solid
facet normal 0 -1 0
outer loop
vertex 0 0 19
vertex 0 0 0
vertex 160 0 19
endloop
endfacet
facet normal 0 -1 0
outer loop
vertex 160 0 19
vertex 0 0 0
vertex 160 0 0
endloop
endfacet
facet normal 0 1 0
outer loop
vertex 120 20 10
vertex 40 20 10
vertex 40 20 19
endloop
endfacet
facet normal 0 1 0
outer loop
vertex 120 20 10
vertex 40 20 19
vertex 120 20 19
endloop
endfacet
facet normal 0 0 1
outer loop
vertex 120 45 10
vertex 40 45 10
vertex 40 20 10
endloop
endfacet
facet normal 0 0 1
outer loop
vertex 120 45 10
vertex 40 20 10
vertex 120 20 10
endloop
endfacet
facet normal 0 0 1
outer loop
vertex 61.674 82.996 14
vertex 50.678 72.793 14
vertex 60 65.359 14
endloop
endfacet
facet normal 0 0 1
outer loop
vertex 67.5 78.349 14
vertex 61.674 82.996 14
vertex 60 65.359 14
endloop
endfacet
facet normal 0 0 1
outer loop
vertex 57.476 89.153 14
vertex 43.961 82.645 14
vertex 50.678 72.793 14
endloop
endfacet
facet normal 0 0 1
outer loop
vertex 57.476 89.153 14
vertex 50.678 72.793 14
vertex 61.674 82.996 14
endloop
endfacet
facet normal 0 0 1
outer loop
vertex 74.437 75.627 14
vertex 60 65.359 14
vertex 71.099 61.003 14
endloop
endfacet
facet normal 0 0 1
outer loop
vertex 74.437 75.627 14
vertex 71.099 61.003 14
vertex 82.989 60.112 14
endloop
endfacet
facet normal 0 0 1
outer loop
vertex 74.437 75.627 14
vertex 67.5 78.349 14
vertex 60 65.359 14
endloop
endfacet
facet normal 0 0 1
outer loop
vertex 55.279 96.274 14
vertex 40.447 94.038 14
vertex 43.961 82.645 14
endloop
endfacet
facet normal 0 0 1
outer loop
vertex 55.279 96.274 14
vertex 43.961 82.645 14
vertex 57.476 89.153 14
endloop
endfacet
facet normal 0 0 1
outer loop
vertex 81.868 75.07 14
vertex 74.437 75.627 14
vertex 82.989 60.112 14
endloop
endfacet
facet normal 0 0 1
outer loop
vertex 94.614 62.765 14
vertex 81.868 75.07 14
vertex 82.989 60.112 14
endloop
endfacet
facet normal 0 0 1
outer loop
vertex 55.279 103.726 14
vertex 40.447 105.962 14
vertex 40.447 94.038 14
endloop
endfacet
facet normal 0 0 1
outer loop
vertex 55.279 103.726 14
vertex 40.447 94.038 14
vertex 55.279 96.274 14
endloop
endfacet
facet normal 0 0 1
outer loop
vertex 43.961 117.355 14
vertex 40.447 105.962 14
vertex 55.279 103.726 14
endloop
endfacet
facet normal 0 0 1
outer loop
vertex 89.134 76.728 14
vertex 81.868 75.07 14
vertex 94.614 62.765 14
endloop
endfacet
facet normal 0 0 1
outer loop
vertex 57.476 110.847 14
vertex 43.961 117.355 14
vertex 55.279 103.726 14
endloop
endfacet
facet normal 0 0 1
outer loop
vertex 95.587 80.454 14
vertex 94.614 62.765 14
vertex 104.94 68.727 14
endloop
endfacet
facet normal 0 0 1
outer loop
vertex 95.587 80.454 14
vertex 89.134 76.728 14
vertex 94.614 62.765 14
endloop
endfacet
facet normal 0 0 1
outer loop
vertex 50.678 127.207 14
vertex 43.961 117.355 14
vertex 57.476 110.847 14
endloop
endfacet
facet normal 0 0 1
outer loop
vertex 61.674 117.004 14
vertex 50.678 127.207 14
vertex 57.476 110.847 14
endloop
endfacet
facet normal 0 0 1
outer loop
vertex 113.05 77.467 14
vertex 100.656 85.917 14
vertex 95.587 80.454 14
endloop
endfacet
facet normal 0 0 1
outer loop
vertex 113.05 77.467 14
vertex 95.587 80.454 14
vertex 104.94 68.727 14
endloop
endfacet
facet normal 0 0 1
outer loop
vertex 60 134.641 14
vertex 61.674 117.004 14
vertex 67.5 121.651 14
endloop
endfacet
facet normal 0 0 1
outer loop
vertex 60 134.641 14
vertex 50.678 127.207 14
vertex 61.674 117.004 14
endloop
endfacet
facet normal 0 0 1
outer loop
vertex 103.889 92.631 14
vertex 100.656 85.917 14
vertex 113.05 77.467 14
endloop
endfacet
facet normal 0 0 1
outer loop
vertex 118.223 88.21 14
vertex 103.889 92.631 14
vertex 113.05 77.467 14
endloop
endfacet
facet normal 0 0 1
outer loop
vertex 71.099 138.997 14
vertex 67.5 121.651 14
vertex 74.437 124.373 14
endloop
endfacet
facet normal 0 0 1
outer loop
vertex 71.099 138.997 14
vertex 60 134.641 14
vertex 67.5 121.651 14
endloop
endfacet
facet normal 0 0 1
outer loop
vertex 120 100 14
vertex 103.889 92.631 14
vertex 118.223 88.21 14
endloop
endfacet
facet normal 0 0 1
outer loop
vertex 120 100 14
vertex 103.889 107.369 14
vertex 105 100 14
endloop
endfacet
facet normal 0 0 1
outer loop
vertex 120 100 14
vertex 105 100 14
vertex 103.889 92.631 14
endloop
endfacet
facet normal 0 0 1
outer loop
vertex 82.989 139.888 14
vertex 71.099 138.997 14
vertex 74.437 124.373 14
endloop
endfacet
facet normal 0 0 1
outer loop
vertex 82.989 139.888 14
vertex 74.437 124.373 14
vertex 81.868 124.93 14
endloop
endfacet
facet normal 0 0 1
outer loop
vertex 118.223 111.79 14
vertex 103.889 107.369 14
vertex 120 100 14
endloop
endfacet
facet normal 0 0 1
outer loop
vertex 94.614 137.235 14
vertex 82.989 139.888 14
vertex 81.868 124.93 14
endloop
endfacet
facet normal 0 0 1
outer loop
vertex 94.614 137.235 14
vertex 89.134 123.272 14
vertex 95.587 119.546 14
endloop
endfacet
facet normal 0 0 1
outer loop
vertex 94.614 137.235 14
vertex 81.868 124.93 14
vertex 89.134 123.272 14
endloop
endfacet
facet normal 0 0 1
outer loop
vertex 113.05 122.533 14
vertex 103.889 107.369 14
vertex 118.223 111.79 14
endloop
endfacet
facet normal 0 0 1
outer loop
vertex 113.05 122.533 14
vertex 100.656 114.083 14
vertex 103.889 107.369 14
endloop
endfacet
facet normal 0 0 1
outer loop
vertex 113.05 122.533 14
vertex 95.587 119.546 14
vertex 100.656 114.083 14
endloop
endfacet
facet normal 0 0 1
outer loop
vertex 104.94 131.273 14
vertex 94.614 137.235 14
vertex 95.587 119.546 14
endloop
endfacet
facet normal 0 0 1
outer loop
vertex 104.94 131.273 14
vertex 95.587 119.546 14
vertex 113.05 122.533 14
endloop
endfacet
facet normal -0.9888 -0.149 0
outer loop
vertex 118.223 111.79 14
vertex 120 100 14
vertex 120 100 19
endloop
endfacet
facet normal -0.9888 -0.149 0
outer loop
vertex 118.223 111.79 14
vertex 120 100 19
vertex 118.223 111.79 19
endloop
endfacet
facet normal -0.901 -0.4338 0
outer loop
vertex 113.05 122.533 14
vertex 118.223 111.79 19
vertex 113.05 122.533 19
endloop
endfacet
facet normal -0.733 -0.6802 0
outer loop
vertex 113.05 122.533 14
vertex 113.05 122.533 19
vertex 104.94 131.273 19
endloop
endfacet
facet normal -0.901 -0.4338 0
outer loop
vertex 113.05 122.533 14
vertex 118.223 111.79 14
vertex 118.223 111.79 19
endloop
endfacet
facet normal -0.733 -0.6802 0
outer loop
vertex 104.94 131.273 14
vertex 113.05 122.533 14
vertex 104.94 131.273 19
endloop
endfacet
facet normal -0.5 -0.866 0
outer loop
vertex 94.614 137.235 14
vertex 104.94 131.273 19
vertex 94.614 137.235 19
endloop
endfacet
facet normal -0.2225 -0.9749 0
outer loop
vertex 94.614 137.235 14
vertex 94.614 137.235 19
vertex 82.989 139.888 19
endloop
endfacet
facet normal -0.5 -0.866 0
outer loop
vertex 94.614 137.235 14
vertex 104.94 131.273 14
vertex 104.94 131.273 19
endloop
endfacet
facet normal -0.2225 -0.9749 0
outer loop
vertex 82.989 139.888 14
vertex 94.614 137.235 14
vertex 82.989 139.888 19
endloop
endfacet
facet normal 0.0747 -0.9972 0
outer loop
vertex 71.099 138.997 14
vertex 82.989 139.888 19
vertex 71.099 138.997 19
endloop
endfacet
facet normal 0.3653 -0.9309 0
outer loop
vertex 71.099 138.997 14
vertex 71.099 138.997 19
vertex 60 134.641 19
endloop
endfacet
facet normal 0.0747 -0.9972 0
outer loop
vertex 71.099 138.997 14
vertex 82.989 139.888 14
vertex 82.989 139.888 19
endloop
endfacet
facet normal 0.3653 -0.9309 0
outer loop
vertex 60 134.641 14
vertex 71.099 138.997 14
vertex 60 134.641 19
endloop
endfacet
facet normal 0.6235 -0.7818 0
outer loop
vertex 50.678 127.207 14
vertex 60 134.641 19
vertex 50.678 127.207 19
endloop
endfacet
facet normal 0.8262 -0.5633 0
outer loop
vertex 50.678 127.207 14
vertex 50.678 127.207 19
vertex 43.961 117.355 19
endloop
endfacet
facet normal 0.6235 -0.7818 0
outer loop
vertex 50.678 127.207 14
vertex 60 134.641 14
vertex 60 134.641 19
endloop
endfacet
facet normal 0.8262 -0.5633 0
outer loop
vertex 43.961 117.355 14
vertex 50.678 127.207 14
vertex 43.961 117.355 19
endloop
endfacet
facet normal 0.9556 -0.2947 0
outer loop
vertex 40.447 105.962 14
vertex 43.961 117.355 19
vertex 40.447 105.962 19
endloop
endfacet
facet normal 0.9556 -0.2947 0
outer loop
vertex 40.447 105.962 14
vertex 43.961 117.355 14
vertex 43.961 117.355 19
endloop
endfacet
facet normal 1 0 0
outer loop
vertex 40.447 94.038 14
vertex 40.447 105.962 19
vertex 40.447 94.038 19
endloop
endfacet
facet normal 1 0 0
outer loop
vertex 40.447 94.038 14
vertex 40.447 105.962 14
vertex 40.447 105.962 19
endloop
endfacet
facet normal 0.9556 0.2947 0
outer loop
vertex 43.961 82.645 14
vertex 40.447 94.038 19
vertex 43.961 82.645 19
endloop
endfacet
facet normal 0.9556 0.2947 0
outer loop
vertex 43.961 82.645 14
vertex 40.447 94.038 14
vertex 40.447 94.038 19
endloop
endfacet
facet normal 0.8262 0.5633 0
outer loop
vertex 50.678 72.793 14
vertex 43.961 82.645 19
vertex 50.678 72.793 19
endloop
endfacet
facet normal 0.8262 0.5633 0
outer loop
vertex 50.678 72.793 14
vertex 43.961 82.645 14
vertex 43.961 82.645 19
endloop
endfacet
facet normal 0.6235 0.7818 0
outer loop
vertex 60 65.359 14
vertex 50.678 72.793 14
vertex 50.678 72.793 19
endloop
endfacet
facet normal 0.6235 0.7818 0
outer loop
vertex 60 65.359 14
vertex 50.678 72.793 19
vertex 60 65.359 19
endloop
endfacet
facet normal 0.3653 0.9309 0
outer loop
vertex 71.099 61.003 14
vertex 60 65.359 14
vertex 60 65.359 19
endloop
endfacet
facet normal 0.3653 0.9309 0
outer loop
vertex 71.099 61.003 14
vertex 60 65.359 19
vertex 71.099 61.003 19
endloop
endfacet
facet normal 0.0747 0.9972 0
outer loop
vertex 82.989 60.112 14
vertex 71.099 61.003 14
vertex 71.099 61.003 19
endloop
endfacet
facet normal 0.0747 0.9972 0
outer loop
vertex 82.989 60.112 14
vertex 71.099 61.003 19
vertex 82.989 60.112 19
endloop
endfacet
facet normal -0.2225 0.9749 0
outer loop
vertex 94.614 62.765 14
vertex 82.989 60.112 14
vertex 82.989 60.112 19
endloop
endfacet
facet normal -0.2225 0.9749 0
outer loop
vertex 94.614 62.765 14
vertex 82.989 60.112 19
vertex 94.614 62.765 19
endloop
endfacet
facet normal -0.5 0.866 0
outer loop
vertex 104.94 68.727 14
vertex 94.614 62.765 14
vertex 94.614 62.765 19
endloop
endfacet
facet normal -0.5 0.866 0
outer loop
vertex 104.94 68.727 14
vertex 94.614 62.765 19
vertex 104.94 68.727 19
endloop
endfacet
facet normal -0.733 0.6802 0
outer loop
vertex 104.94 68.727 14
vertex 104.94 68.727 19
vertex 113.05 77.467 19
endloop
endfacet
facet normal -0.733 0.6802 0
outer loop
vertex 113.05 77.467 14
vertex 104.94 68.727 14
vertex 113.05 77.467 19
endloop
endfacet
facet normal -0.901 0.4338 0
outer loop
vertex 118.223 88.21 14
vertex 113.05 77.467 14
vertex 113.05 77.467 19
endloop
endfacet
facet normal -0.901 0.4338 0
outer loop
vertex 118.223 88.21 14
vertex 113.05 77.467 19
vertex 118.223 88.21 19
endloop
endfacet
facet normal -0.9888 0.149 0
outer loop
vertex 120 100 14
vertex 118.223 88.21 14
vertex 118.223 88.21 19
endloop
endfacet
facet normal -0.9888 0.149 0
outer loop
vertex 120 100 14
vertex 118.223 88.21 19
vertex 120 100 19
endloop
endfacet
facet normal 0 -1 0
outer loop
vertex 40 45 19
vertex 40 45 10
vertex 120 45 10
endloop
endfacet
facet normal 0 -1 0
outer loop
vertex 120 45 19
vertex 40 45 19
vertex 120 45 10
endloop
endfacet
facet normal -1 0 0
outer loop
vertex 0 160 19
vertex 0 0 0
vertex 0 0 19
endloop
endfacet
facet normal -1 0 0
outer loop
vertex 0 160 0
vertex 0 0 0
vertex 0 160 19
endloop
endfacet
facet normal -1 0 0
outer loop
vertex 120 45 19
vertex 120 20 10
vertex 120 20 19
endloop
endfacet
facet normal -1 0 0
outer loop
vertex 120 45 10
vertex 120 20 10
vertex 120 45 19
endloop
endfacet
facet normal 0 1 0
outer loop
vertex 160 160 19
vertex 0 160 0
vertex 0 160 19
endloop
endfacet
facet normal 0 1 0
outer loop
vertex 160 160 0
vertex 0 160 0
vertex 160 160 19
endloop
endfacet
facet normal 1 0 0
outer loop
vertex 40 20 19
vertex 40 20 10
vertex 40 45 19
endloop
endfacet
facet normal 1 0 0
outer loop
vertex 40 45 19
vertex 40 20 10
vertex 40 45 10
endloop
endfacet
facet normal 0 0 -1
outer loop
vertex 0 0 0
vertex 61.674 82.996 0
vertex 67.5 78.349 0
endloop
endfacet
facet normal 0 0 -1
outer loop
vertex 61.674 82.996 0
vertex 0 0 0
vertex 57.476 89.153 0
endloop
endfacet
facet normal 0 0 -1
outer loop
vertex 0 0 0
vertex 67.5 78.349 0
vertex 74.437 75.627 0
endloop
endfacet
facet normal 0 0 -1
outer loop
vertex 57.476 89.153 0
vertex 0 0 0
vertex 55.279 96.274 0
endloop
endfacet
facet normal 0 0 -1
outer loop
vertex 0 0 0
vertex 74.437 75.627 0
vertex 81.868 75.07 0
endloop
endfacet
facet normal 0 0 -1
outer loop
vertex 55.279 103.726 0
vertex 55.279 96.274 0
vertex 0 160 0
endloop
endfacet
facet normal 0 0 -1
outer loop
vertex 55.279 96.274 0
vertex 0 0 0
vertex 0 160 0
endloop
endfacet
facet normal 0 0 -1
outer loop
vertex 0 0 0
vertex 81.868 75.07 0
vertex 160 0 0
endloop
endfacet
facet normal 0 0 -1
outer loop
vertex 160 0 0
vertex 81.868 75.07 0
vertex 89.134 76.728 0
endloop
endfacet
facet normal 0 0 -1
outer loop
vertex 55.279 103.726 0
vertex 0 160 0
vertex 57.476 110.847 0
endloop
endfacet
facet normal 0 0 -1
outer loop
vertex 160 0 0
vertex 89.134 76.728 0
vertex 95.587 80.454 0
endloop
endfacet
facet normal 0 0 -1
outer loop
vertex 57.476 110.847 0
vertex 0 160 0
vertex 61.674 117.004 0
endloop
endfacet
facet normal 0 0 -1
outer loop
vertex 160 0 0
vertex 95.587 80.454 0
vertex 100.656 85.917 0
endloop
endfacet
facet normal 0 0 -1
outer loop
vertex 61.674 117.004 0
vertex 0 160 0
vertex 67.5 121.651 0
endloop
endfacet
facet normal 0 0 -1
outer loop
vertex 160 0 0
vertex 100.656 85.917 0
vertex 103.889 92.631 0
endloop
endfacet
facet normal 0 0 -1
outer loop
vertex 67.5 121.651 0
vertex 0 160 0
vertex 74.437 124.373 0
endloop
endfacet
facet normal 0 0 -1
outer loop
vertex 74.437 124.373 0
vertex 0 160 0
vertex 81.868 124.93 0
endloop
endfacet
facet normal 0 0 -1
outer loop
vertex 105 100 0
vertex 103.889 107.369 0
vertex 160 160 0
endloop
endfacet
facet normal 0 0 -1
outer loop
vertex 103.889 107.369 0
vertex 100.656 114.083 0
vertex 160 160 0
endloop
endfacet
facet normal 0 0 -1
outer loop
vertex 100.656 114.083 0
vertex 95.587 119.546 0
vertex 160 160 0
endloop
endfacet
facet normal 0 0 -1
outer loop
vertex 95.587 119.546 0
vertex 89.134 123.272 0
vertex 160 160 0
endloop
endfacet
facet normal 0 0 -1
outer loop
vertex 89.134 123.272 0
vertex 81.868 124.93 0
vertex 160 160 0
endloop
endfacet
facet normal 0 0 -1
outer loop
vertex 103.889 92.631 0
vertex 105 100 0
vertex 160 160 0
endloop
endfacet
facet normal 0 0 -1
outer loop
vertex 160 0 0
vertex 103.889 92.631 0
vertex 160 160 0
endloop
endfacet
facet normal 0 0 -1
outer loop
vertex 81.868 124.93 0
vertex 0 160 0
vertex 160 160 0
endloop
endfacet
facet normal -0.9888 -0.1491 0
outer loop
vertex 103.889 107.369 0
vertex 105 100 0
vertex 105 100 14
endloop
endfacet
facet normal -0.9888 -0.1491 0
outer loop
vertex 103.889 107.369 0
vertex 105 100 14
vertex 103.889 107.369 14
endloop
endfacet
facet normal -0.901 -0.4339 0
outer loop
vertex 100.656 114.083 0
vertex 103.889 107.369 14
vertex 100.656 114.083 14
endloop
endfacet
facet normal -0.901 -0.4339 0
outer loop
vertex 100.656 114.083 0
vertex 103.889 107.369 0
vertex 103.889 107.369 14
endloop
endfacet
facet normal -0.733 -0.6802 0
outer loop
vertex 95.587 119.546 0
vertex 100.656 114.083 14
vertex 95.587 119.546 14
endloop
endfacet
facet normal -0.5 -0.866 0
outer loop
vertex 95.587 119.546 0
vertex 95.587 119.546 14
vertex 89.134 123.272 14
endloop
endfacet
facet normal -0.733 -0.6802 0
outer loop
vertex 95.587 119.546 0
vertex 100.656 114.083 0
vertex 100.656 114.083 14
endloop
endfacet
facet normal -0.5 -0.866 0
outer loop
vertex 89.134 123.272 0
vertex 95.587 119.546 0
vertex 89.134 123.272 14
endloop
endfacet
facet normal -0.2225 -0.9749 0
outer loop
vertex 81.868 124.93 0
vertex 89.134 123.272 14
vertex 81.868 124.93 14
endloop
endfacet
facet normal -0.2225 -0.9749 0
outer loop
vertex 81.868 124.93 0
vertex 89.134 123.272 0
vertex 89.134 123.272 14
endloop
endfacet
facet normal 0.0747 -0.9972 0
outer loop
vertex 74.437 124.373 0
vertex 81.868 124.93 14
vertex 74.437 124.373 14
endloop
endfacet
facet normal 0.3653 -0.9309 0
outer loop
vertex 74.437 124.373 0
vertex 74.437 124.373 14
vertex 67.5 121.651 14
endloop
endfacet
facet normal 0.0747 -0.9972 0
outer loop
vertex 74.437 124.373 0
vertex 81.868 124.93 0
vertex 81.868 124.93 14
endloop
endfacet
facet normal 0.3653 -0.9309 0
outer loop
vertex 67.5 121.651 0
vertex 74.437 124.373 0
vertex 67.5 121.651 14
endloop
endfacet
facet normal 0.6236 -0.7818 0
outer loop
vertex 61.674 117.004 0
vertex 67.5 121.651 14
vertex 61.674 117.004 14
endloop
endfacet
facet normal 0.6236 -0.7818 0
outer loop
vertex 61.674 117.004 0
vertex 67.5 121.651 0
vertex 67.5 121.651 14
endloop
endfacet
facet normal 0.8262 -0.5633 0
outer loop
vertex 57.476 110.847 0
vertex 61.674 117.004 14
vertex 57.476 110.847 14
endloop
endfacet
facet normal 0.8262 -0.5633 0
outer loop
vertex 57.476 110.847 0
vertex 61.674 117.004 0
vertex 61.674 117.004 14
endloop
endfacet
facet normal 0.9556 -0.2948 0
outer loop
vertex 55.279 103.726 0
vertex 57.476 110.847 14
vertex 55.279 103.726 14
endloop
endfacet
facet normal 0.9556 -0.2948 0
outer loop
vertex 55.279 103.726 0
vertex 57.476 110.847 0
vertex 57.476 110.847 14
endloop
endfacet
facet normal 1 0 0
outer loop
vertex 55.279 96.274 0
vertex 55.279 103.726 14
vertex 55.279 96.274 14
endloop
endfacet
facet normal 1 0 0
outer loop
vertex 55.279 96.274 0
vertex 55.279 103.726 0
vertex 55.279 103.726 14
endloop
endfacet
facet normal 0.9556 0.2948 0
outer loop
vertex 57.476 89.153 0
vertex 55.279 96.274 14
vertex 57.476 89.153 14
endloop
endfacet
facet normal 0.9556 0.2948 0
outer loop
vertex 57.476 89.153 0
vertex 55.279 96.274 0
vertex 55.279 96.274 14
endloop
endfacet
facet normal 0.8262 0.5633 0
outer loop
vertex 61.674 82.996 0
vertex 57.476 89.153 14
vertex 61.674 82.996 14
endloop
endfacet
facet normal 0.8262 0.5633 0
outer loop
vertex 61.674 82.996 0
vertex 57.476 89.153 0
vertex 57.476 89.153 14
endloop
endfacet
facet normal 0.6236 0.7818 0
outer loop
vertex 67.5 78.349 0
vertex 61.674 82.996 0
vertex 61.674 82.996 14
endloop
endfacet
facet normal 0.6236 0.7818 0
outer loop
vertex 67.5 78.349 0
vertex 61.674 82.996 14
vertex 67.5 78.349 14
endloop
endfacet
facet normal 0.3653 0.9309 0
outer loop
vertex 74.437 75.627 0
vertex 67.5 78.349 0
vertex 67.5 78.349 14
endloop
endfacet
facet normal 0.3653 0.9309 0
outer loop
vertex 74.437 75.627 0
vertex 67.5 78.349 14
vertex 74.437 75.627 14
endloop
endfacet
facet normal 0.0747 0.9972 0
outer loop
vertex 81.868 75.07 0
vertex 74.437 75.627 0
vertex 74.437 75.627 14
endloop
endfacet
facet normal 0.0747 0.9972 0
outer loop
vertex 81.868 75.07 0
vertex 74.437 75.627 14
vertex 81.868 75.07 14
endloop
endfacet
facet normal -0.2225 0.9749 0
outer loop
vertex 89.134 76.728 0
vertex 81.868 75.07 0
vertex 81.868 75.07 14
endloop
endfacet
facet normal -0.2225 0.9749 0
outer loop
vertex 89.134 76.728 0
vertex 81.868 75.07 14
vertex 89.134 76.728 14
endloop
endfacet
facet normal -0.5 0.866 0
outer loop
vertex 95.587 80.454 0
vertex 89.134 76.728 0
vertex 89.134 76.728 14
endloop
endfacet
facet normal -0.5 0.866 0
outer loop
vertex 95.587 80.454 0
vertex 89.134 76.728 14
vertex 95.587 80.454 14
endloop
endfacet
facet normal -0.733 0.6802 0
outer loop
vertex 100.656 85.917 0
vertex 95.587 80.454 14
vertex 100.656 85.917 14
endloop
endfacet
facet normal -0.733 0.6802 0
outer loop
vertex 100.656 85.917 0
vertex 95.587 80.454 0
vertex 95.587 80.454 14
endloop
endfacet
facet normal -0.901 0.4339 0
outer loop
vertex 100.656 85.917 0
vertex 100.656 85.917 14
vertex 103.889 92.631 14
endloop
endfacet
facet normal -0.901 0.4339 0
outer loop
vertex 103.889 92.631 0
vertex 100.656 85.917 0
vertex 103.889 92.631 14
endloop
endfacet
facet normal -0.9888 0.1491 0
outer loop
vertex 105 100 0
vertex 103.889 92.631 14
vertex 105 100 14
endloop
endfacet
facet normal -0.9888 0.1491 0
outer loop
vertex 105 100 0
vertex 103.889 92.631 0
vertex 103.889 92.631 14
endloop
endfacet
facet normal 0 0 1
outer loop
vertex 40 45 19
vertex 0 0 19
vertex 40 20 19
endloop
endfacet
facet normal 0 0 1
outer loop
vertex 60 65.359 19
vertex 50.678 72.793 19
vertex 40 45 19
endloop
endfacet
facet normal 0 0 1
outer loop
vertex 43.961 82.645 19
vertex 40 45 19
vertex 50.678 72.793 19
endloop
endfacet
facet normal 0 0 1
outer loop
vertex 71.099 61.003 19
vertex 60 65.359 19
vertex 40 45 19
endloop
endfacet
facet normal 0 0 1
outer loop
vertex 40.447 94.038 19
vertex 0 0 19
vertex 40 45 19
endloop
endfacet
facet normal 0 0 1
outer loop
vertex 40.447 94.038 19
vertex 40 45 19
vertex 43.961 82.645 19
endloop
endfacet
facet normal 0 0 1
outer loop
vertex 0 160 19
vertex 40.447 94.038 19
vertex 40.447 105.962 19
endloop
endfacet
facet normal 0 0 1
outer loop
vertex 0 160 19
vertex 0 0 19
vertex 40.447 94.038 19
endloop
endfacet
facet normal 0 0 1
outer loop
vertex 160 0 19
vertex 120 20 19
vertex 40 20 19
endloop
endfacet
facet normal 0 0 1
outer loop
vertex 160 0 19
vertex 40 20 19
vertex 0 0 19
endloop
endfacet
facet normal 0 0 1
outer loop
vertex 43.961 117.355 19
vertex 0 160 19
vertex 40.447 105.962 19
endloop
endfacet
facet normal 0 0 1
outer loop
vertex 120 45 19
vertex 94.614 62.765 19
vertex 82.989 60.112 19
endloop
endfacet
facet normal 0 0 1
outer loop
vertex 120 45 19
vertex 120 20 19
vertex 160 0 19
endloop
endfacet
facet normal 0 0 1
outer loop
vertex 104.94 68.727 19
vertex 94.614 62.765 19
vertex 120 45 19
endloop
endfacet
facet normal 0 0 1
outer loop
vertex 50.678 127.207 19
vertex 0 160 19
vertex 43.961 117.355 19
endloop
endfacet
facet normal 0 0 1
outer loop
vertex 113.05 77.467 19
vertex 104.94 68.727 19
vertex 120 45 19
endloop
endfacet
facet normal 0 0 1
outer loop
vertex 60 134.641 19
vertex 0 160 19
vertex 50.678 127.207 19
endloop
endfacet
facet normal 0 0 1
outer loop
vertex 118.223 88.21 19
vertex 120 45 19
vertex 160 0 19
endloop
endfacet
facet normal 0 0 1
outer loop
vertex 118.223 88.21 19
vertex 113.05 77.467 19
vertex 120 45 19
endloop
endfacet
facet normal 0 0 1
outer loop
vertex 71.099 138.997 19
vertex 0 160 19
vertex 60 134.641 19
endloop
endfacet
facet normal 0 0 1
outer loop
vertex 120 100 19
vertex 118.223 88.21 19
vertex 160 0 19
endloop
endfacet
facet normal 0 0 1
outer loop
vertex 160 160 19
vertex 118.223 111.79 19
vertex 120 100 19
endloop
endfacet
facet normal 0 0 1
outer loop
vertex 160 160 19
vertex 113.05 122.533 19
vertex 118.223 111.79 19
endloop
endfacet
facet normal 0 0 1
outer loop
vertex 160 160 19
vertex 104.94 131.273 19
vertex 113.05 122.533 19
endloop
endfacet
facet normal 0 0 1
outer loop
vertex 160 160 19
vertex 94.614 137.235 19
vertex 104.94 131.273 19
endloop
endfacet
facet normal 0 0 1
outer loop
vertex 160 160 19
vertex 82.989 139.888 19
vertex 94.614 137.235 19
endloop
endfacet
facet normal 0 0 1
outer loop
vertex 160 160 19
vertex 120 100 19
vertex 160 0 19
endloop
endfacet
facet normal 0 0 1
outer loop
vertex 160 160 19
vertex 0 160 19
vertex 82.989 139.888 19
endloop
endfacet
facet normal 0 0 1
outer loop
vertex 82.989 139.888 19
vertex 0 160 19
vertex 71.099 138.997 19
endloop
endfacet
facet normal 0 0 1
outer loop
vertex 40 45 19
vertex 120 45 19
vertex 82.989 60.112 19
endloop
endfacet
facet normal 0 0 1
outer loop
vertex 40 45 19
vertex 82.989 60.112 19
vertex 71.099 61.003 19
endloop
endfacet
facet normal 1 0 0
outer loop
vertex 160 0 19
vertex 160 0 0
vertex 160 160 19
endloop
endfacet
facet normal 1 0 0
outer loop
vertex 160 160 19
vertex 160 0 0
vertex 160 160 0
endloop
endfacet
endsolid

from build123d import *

# Parameters (mm, degrees)
F0_W     = 160
F0_H     = 160
F0_W_2   = 80
F0_H_2   = 25
F0_R     = 40
F1_DEPTH = 19
F0_R_2   = 25
F2_DEPTH = 14
F3_DEPTH = 10


with BuildPart() as f1:
    # F0 (on Top) → F1 (new body)
    with BuildSketch(Plane.XY):
        with Locations((80, 80)):
            Rectangle(F0_W, F0_H)
        with Locations((80, 32.5)):
            Rectangle(F0_W_2, F0_H_2, mode=Mode.SUBTRACT)
        with Locations((80, 100)):
            Circle(F0_R, mode=Mode.SUBTRACT)
    extrude(amount=F1_DEPTH)

    # F0 (on Top) → F2 (join)
    with BuildSketch(Plane.XY):
        with Locations((80, 100)):
            Circle(F0_R)
        with Locations((80, 100)):
            Circle(F0_R_2, mode=Mode.SUBTRACT)
    extrude(amount=F2_DEPTH)

    # F0 (on Top) → F3 (join)
    with BuildSketch(Plane.XY):
        with Locations((80, 32.5)):
            Rectangle(F0_W_2, F0_H_2)
    extrude(amount=F3_DEPTH)


solid = f1.part
